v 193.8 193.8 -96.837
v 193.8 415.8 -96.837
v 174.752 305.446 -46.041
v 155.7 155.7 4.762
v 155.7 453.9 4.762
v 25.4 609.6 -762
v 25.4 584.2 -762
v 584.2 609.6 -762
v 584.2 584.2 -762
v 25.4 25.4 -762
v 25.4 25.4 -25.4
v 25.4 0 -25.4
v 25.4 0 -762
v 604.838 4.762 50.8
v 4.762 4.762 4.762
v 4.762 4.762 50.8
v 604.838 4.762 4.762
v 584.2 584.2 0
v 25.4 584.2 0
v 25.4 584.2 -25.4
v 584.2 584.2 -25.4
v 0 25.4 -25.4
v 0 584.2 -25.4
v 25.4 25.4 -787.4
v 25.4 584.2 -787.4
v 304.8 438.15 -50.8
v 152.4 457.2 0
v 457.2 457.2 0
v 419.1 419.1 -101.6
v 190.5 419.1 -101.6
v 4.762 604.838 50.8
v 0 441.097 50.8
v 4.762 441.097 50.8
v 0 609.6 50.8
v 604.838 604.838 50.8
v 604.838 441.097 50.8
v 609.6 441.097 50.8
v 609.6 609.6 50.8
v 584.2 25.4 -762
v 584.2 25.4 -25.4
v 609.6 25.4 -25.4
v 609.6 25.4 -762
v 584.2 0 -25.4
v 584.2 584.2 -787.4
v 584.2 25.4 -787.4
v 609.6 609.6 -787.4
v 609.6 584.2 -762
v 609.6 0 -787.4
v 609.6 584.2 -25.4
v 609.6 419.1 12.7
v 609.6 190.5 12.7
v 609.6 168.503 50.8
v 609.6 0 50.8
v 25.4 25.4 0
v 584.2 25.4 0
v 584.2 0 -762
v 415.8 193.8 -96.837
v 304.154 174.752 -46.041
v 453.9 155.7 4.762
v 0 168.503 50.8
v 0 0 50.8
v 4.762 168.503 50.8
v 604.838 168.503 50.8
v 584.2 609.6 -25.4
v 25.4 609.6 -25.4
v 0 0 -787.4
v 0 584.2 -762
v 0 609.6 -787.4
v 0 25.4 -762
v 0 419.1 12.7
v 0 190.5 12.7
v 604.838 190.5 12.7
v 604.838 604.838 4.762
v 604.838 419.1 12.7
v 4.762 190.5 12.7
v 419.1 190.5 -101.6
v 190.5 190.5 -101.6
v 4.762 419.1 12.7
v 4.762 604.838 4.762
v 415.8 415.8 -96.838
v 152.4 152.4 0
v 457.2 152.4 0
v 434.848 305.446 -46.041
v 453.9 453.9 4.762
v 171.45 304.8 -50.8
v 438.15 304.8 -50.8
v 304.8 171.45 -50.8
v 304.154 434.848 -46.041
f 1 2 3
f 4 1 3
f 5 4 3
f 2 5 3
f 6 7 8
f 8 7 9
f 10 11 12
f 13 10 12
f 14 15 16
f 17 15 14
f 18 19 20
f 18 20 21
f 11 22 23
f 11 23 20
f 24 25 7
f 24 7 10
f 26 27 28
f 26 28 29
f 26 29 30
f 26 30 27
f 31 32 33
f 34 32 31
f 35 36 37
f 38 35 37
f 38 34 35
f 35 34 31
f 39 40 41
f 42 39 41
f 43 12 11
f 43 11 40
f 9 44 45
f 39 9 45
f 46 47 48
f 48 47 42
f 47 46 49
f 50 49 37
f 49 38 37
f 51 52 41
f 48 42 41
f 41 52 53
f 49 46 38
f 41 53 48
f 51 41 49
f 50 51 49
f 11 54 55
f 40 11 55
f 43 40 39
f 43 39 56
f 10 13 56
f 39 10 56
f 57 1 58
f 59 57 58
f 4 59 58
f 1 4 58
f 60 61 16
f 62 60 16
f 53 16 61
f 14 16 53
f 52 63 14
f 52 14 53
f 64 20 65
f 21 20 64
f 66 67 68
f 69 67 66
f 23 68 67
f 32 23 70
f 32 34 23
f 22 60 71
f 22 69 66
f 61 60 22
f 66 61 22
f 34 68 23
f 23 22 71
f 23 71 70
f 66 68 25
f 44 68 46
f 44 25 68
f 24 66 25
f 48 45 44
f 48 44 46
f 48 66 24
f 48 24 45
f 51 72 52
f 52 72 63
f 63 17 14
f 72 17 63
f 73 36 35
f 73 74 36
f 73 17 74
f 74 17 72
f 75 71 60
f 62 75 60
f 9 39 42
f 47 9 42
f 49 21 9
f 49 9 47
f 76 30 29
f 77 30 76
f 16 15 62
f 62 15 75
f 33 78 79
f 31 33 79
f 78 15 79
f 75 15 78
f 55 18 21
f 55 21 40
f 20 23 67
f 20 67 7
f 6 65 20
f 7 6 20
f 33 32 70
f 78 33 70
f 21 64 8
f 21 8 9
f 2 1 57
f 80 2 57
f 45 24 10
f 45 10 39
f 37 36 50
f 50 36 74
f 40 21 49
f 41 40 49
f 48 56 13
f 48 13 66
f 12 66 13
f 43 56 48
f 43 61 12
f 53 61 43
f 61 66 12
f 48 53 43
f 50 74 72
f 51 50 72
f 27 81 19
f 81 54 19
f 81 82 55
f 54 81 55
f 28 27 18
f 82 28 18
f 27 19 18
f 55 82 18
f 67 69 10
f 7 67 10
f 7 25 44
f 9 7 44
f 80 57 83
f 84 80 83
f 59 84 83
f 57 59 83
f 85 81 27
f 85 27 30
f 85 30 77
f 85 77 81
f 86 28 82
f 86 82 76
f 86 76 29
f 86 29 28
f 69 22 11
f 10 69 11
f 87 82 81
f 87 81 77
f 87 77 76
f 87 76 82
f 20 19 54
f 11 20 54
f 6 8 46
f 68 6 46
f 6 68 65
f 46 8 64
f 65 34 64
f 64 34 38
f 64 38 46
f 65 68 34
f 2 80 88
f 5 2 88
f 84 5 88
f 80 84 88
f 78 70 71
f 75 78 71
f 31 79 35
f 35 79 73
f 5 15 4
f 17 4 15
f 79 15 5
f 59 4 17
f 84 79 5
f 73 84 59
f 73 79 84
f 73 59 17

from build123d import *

# Parameters (mm, degrees)
F0_W      = 609.6
F0_H      = 609.6
F1_DEPTH  = 50.8
F2_W      = 304.8
F2_H      = 304.8
F4_W      = 228.6
F4_H      = 228.6
F6_T      = -4.7625
F7_W      = 609.6
F7_H      = 609.6
F7_W_2    = 558.8
F7_H_2    = 558.8
F8_DEPTH  = 25.4
F10_DEPTH = 609.601
F11_W     = 25.4
F11_H     = 25.4
F12_DEPTH = 762
F13_W     = 609.6
F13_H     = 609.6
F13_W_2   = 558.8
F13_H_2   = 558.8
F14_DEPTH = 25.4


with BuildPart() as f1:
    # F0 (on Top) → F1 (new body)
    with BuildSketch(Plane.XY):
        with Locations((304.8, 304.8)):
            Rectangle(F0_W, F0_H)
    extrude(amount=F1_DEPTH)

    # F2 (on face) → F5 section 0
    with BuildSketch(Plane(origin=(0, 0, 0), x_dir=(1, 0, 0), z_dir=(0, 0, -1))):
        with Locations((304.8, -304.8)):
            Rectangle(F2_W, F2_H)
    # F4 (on offset) → F5 section 1
    with BuildSketch(Plane(origin=(0, 0, -101.6), x_dir=(1, 0, 0), z_dir=(0, 0, -1))):
        with Locations((304.8, -304.8)):
            Rectangle(F4_W, F4_H)
    loft()

    # F6
    f6_openings = [f1.faces().sort_by_distance(p)[0] for p in [
        (304.8, 304.8, 50.8),
    ]]
    offset(amount=F6_T, openings=f6_openings, kind=Kind.INTERSECTION)

    # F7 (on face) → F8 (join)
    with BuildSketch(Plane(origin=(0, 0, 0), x_dir=(1, 0, 0), z_dir=(0, 0, -1))):
        with Locations((304.8, -304.8)):
            Rectangle(F7_W, F7_H)
        with Locations((304.8, -304.8)):
            Rectangle(F7_W_2, F7_H_2, mode=Mode.SUBTRACT)
    extrude(amount=F8_DEPTH)

    # F9 (on face) → F10 (cut, through all)
    with BuildSketch(Plane(origin=(0, 0, 0), x_dir=(0, -1, 0), z_dir=(-1, 0, 0))):
        Polygon((-441.0970452561, 50.8), (-419.1, 12.7), (-190.5, 12.7), (-168.5029547439, 50.8), align=None)
    extrude(amount=-F10_DEPTH, mode=Mode.SUBTRACT)

    # F11 (on face) → F12 (join)
    with BuildSketch(Plane(origin=(0, 0, -25.4), x_dir=(1, 0, 0), z_dir=(0, 0, -1))):
        with Locations((12.7, -12.7)):
            Rectangle(F11_W, F11_H)
        with Locations((596.9, -12.7)):
            Rectangle(F11_W, F11_H)
        with Locations((596.9, -596.9)):
            Rectangle(F11_W, F11_H)
        with Locations((12.7, -596.9)):
            Rectangle(F11_W, F11_H)
    extrude(amount=F12_DEPTH)

    # F13 (on face) → F14 (join)
    with BuildSketch(Plane(origin=(0, 0, -787.4), x_dir=(1, 0, 0), z_dir=(0, 0, -1))):
        with Locations((304.8, -304.8)):
            Rectangle(F13_W, F13_H)
        with Locations((304.8, -304.8)):
            Rectangle(F13_W_2, F13_H_2, mode=Mode.SUBTRACT)
    extrude(amount=-F14_DEPTH)


solid = f1.part
